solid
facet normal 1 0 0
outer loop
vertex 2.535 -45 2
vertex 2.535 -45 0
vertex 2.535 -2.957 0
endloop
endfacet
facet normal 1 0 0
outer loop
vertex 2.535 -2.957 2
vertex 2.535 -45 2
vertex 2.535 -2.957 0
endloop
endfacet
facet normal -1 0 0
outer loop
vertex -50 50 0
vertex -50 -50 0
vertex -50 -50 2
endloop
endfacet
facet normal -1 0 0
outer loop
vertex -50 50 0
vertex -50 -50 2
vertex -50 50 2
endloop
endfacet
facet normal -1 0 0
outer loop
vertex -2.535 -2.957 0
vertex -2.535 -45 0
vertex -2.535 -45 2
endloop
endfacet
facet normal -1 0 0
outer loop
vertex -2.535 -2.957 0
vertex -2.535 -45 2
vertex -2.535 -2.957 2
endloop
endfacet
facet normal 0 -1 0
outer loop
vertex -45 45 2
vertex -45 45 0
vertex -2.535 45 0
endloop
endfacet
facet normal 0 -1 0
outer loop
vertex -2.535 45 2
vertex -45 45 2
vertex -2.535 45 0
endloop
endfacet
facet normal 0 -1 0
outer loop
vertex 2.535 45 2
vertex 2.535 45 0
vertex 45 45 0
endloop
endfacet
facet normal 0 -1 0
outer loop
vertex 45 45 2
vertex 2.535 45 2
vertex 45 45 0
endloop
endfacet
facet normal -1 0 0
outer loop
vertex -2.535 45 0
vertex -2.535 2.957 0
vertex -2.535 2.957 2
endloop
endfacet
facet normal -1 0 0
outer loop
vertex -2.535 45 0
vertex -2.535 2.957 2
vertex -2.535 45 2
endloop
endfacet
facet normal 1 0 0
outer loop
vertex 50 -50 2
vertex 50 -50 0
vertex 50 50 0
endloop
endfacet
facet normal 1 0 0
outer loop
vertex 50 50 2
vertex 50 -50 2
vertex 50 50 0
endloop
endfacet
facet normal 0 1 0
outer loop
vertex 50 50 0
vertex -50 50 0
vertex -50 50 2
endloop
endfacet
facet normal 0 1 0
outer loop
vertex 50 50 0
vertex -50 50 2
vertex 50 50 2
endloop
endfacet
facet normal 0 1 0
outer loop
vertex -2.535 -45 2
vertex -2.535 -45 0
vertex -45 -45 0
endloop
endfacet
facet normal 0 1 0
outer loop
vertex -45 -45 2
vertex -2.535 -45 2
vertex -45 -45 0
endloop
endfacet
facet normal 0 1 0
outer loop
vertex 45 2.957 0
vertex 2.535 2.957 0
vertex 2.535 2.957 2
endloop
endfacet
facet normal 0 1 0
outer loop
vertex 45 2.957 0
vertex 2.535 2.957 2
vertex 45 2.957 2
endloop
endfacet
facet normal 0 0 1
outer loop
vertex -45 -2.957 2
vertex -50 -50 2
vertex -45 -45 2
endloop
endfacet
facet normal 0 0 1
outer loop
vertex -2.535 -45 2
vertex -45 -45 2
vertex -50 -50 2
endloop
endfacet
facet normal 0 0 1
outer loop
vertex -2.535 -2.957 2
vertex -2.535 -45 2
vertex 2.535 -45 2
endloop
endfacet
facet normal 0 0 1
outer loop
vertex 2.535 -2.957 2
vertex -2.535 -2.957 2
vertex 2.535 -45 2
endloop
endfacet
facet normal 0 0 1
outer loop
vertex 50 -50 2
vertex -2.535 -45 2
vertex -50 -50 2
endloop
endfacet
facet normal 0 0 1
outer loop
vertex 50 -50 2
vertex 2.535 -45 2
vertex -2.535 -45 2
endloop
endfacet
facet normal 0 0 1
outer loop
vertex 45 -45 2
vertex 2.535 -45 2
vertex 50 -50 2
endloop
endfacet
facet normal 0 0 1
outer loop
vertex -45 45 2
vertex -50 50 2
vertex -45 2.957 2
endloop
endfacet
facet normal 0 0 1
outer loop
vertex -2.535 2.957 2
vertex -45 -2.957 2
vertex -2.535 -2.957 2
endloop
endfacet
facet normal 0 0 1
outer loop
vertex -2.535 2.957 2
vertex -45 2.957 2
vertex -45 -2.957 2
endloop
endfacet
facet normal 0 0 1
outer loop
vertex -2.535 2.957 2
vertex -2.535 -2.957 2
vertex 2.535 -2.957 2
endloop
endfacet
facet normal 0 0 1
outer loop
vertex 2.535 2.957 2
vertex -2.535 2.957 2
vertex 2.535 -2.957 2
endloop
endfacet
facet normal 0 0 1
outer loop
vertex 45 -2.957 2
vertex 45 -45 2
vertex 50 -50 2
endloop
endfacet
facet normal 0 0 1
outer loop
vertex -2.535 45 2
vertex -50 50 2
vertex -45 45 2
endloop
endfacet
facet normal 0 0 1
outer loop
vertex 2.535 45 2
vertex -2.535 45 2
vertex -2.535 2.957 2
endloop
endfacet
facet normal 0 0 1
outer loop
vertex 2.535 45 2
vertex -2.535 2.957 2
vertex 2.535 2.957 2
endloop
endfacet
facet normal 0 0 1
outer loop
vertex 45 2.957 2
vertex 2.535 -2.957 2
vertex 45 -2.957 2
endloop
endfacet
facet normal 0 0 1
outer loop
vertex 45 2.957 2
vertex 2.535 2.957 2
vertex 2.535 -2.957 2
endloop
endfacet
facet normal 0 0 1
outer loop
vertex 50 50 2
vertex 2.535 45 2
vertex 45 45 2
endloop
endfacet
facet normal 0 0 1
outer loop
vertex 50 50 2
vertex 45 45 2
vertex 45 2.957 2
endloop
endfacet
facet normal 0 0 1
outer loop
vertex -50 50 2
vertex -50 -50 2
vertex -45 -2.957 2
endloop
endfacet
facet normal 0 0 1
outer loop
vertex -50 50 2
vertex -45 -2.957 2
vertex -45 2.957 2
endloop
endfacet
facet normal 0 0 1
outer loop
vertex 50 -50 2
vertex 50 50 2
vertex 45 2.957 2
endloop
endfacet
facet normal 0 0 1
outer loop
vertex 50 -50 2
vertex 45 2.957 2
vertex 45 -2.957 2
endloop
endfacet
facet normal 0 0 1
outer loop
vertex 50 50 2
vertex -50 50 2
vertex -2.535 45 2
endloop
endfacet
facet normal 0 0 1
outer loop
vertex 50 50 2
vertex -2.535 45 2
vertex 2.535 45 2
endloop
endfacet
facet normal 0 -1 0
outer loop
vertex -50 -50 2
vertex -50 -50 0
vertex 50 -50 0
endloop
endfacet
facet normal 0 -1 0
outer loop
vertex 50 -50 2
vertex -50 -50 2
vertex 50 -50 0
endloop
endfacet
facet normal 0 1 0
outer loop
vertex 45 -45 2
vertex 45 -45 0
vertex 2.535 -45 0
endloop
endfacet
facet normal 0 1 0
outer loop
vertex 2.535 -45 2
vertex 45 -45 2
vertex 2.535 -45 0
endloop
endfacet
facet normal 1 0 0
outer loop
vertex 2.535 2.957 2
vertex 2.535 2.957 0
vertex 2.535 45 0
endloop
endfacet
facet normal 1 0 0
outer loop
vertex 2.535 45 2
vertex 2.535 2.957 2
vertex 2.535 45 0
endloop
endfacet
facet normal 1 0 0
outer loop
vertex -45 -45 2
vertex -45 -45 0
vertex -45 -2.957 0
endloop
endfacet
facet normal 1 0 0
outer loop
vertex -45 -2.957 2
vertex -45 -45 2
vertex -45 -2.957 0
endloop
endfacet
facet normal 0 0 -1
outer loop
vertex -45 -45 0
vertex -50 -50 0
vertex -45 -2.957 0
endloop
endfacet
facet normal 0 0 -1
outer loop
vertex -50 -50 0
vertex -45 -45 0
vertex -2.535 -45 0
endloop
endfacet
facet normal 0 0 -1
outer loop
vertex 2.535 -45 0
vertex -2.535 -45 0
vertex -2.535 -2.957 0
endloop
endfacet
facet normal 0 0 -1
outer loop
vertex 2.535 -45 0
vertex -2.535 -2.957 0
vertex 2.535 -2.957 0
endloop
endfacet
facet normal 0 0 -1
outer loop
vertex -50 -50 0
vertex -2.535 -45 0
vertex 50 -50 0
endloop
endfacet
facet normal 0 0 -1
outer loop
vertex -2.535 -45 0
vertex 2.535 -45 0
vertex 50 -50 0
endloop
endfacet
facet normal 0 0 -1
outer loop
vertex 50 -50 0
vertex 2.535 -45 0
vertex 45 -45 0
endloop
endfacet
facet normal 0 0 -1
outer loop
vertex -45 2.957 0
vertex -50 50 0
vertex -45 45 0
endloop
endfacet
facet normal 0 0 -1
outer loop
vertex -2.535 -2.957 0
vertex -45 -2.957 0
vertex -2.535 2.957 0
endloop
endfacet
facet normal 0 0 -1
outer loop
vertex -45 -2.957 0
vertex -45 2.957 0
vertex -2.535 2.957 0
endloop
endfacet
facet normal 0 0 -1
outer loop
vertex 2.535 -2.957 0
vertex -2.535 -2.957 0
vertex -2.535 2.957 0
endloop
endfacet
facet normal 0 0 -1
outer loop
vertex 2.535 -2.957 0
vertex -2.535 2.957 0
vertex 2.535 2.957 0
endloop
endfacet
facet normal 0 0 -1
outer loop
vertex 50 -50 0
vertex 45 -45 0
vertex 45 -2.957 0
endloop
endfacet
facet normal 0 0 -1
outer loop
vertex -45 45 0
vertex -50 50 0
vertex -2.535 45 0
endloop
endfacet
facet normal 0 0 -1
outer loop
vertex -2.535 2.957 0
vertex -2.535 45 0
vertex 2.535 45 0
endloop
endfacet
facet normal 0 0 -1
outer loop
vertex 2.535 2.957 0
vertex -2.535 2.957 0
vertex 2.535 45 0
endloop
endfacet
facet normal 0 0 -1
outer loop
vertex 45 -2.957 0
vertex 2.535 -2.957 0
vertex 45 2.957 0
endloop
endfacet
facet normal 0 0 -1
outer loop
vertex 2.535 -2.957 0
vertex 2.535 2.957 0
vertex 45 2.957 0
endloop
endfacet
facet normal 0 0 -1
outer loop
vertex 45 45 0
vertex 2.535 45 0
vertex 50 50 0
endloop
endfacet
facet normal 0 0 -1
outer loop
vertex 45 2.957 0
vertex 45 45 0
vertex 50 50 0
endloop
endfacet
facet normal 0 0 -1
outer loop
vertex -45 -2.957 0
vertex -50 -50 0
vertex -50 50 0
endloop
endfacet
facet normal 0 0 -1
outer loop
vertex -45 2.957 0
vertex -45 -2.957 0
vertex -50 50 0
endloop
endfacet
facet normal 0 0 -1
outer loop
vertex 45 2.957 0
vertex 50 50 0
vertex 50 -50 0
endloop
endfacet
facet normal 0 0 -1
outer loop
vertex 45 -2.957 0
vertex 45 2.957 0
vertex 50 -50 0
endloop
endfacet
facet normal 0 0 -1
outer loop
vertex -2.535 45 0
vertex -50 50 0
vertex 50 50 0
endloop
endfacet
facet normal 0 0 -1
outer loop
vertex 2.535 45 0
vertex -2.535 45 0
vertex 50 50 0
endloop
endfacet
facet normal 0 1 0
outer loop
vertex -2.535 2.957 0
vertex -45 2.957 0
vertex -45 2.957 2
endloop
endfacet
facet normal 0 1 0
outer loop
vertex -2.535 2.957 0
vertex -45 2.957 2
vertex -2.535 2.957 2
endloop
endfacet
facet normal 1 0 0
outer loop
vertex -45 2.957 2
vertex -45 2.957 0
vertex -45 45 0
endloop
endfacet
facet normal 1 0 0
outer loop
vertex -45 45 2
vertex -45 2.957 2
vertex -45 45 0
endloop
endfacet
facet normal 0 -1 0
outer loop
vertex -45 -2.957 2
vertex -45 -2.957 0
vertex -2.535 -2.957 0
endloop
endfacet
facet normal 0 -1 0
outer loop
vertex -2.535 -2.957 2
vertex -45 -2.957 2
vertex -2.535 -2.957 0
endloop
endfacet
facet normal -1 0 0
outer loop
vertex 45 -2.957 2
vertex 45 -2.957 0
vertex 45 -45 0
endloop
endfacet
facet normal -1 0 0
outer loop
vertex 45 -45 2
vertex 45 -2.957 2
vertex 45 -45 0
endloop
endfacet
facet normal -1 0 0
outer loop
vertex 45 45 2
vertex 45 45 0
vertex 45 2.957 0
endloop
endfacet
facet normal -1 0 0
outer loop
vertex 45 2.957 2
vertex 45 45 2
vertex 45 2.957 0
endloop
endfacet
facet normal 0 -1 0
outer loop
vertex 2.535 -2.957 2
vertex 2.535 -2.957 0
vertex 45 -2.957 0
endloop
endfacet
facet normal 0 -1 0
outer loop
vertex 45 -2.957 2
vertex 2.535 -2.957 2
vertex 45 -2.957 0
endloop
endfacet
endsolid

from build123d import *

# Parameters (mm, degrees)
F0_W     = 100
F0_H     = 100
F0_W_2   = 42.465364635
F0_H_2   = 5.9141498059
F0_W_3   = 5.06927073
F0_H_3   = 42.042925097
F1_DEPTH = 2


with BuildPart() as f1:
    # F0 (on Top) → F1 (new body)
    with BuildSketch(Plane.XY):
        Rectangle(F0_W, F0_H)
        Polygon((2.534635365, 45), (45, 45), (45, 2.957074903), (45, -2.957074903), (45, -45), (2.534635365, -45), (-2.534635365, -45), (-45, -45), (-45, -2.957074903), (-45, 2.957074903), (-45, 45), (-2.534635365, 45), align=None, mode=Mode.SUBTRACT)
        with Locations((-23.7673176825, 0)):
            Rectangle(F0_W_2, F0_H_2)
        with Locations((23.7673176825, 0)):
            Rectangle(F0_W_2, F0_H_2)
        with Locations((0, 23.9785374515)):
            Rectangle(F0_W_3, F0_H_3)
        with Locations((0, -23.9785374515)):
            Rectangle(F0_W_3, F0_H_3)
        Rectangle(F0_W_3, F0_H_2)
    extrude(amount=F1_DEPTH)


solid = f1.part
